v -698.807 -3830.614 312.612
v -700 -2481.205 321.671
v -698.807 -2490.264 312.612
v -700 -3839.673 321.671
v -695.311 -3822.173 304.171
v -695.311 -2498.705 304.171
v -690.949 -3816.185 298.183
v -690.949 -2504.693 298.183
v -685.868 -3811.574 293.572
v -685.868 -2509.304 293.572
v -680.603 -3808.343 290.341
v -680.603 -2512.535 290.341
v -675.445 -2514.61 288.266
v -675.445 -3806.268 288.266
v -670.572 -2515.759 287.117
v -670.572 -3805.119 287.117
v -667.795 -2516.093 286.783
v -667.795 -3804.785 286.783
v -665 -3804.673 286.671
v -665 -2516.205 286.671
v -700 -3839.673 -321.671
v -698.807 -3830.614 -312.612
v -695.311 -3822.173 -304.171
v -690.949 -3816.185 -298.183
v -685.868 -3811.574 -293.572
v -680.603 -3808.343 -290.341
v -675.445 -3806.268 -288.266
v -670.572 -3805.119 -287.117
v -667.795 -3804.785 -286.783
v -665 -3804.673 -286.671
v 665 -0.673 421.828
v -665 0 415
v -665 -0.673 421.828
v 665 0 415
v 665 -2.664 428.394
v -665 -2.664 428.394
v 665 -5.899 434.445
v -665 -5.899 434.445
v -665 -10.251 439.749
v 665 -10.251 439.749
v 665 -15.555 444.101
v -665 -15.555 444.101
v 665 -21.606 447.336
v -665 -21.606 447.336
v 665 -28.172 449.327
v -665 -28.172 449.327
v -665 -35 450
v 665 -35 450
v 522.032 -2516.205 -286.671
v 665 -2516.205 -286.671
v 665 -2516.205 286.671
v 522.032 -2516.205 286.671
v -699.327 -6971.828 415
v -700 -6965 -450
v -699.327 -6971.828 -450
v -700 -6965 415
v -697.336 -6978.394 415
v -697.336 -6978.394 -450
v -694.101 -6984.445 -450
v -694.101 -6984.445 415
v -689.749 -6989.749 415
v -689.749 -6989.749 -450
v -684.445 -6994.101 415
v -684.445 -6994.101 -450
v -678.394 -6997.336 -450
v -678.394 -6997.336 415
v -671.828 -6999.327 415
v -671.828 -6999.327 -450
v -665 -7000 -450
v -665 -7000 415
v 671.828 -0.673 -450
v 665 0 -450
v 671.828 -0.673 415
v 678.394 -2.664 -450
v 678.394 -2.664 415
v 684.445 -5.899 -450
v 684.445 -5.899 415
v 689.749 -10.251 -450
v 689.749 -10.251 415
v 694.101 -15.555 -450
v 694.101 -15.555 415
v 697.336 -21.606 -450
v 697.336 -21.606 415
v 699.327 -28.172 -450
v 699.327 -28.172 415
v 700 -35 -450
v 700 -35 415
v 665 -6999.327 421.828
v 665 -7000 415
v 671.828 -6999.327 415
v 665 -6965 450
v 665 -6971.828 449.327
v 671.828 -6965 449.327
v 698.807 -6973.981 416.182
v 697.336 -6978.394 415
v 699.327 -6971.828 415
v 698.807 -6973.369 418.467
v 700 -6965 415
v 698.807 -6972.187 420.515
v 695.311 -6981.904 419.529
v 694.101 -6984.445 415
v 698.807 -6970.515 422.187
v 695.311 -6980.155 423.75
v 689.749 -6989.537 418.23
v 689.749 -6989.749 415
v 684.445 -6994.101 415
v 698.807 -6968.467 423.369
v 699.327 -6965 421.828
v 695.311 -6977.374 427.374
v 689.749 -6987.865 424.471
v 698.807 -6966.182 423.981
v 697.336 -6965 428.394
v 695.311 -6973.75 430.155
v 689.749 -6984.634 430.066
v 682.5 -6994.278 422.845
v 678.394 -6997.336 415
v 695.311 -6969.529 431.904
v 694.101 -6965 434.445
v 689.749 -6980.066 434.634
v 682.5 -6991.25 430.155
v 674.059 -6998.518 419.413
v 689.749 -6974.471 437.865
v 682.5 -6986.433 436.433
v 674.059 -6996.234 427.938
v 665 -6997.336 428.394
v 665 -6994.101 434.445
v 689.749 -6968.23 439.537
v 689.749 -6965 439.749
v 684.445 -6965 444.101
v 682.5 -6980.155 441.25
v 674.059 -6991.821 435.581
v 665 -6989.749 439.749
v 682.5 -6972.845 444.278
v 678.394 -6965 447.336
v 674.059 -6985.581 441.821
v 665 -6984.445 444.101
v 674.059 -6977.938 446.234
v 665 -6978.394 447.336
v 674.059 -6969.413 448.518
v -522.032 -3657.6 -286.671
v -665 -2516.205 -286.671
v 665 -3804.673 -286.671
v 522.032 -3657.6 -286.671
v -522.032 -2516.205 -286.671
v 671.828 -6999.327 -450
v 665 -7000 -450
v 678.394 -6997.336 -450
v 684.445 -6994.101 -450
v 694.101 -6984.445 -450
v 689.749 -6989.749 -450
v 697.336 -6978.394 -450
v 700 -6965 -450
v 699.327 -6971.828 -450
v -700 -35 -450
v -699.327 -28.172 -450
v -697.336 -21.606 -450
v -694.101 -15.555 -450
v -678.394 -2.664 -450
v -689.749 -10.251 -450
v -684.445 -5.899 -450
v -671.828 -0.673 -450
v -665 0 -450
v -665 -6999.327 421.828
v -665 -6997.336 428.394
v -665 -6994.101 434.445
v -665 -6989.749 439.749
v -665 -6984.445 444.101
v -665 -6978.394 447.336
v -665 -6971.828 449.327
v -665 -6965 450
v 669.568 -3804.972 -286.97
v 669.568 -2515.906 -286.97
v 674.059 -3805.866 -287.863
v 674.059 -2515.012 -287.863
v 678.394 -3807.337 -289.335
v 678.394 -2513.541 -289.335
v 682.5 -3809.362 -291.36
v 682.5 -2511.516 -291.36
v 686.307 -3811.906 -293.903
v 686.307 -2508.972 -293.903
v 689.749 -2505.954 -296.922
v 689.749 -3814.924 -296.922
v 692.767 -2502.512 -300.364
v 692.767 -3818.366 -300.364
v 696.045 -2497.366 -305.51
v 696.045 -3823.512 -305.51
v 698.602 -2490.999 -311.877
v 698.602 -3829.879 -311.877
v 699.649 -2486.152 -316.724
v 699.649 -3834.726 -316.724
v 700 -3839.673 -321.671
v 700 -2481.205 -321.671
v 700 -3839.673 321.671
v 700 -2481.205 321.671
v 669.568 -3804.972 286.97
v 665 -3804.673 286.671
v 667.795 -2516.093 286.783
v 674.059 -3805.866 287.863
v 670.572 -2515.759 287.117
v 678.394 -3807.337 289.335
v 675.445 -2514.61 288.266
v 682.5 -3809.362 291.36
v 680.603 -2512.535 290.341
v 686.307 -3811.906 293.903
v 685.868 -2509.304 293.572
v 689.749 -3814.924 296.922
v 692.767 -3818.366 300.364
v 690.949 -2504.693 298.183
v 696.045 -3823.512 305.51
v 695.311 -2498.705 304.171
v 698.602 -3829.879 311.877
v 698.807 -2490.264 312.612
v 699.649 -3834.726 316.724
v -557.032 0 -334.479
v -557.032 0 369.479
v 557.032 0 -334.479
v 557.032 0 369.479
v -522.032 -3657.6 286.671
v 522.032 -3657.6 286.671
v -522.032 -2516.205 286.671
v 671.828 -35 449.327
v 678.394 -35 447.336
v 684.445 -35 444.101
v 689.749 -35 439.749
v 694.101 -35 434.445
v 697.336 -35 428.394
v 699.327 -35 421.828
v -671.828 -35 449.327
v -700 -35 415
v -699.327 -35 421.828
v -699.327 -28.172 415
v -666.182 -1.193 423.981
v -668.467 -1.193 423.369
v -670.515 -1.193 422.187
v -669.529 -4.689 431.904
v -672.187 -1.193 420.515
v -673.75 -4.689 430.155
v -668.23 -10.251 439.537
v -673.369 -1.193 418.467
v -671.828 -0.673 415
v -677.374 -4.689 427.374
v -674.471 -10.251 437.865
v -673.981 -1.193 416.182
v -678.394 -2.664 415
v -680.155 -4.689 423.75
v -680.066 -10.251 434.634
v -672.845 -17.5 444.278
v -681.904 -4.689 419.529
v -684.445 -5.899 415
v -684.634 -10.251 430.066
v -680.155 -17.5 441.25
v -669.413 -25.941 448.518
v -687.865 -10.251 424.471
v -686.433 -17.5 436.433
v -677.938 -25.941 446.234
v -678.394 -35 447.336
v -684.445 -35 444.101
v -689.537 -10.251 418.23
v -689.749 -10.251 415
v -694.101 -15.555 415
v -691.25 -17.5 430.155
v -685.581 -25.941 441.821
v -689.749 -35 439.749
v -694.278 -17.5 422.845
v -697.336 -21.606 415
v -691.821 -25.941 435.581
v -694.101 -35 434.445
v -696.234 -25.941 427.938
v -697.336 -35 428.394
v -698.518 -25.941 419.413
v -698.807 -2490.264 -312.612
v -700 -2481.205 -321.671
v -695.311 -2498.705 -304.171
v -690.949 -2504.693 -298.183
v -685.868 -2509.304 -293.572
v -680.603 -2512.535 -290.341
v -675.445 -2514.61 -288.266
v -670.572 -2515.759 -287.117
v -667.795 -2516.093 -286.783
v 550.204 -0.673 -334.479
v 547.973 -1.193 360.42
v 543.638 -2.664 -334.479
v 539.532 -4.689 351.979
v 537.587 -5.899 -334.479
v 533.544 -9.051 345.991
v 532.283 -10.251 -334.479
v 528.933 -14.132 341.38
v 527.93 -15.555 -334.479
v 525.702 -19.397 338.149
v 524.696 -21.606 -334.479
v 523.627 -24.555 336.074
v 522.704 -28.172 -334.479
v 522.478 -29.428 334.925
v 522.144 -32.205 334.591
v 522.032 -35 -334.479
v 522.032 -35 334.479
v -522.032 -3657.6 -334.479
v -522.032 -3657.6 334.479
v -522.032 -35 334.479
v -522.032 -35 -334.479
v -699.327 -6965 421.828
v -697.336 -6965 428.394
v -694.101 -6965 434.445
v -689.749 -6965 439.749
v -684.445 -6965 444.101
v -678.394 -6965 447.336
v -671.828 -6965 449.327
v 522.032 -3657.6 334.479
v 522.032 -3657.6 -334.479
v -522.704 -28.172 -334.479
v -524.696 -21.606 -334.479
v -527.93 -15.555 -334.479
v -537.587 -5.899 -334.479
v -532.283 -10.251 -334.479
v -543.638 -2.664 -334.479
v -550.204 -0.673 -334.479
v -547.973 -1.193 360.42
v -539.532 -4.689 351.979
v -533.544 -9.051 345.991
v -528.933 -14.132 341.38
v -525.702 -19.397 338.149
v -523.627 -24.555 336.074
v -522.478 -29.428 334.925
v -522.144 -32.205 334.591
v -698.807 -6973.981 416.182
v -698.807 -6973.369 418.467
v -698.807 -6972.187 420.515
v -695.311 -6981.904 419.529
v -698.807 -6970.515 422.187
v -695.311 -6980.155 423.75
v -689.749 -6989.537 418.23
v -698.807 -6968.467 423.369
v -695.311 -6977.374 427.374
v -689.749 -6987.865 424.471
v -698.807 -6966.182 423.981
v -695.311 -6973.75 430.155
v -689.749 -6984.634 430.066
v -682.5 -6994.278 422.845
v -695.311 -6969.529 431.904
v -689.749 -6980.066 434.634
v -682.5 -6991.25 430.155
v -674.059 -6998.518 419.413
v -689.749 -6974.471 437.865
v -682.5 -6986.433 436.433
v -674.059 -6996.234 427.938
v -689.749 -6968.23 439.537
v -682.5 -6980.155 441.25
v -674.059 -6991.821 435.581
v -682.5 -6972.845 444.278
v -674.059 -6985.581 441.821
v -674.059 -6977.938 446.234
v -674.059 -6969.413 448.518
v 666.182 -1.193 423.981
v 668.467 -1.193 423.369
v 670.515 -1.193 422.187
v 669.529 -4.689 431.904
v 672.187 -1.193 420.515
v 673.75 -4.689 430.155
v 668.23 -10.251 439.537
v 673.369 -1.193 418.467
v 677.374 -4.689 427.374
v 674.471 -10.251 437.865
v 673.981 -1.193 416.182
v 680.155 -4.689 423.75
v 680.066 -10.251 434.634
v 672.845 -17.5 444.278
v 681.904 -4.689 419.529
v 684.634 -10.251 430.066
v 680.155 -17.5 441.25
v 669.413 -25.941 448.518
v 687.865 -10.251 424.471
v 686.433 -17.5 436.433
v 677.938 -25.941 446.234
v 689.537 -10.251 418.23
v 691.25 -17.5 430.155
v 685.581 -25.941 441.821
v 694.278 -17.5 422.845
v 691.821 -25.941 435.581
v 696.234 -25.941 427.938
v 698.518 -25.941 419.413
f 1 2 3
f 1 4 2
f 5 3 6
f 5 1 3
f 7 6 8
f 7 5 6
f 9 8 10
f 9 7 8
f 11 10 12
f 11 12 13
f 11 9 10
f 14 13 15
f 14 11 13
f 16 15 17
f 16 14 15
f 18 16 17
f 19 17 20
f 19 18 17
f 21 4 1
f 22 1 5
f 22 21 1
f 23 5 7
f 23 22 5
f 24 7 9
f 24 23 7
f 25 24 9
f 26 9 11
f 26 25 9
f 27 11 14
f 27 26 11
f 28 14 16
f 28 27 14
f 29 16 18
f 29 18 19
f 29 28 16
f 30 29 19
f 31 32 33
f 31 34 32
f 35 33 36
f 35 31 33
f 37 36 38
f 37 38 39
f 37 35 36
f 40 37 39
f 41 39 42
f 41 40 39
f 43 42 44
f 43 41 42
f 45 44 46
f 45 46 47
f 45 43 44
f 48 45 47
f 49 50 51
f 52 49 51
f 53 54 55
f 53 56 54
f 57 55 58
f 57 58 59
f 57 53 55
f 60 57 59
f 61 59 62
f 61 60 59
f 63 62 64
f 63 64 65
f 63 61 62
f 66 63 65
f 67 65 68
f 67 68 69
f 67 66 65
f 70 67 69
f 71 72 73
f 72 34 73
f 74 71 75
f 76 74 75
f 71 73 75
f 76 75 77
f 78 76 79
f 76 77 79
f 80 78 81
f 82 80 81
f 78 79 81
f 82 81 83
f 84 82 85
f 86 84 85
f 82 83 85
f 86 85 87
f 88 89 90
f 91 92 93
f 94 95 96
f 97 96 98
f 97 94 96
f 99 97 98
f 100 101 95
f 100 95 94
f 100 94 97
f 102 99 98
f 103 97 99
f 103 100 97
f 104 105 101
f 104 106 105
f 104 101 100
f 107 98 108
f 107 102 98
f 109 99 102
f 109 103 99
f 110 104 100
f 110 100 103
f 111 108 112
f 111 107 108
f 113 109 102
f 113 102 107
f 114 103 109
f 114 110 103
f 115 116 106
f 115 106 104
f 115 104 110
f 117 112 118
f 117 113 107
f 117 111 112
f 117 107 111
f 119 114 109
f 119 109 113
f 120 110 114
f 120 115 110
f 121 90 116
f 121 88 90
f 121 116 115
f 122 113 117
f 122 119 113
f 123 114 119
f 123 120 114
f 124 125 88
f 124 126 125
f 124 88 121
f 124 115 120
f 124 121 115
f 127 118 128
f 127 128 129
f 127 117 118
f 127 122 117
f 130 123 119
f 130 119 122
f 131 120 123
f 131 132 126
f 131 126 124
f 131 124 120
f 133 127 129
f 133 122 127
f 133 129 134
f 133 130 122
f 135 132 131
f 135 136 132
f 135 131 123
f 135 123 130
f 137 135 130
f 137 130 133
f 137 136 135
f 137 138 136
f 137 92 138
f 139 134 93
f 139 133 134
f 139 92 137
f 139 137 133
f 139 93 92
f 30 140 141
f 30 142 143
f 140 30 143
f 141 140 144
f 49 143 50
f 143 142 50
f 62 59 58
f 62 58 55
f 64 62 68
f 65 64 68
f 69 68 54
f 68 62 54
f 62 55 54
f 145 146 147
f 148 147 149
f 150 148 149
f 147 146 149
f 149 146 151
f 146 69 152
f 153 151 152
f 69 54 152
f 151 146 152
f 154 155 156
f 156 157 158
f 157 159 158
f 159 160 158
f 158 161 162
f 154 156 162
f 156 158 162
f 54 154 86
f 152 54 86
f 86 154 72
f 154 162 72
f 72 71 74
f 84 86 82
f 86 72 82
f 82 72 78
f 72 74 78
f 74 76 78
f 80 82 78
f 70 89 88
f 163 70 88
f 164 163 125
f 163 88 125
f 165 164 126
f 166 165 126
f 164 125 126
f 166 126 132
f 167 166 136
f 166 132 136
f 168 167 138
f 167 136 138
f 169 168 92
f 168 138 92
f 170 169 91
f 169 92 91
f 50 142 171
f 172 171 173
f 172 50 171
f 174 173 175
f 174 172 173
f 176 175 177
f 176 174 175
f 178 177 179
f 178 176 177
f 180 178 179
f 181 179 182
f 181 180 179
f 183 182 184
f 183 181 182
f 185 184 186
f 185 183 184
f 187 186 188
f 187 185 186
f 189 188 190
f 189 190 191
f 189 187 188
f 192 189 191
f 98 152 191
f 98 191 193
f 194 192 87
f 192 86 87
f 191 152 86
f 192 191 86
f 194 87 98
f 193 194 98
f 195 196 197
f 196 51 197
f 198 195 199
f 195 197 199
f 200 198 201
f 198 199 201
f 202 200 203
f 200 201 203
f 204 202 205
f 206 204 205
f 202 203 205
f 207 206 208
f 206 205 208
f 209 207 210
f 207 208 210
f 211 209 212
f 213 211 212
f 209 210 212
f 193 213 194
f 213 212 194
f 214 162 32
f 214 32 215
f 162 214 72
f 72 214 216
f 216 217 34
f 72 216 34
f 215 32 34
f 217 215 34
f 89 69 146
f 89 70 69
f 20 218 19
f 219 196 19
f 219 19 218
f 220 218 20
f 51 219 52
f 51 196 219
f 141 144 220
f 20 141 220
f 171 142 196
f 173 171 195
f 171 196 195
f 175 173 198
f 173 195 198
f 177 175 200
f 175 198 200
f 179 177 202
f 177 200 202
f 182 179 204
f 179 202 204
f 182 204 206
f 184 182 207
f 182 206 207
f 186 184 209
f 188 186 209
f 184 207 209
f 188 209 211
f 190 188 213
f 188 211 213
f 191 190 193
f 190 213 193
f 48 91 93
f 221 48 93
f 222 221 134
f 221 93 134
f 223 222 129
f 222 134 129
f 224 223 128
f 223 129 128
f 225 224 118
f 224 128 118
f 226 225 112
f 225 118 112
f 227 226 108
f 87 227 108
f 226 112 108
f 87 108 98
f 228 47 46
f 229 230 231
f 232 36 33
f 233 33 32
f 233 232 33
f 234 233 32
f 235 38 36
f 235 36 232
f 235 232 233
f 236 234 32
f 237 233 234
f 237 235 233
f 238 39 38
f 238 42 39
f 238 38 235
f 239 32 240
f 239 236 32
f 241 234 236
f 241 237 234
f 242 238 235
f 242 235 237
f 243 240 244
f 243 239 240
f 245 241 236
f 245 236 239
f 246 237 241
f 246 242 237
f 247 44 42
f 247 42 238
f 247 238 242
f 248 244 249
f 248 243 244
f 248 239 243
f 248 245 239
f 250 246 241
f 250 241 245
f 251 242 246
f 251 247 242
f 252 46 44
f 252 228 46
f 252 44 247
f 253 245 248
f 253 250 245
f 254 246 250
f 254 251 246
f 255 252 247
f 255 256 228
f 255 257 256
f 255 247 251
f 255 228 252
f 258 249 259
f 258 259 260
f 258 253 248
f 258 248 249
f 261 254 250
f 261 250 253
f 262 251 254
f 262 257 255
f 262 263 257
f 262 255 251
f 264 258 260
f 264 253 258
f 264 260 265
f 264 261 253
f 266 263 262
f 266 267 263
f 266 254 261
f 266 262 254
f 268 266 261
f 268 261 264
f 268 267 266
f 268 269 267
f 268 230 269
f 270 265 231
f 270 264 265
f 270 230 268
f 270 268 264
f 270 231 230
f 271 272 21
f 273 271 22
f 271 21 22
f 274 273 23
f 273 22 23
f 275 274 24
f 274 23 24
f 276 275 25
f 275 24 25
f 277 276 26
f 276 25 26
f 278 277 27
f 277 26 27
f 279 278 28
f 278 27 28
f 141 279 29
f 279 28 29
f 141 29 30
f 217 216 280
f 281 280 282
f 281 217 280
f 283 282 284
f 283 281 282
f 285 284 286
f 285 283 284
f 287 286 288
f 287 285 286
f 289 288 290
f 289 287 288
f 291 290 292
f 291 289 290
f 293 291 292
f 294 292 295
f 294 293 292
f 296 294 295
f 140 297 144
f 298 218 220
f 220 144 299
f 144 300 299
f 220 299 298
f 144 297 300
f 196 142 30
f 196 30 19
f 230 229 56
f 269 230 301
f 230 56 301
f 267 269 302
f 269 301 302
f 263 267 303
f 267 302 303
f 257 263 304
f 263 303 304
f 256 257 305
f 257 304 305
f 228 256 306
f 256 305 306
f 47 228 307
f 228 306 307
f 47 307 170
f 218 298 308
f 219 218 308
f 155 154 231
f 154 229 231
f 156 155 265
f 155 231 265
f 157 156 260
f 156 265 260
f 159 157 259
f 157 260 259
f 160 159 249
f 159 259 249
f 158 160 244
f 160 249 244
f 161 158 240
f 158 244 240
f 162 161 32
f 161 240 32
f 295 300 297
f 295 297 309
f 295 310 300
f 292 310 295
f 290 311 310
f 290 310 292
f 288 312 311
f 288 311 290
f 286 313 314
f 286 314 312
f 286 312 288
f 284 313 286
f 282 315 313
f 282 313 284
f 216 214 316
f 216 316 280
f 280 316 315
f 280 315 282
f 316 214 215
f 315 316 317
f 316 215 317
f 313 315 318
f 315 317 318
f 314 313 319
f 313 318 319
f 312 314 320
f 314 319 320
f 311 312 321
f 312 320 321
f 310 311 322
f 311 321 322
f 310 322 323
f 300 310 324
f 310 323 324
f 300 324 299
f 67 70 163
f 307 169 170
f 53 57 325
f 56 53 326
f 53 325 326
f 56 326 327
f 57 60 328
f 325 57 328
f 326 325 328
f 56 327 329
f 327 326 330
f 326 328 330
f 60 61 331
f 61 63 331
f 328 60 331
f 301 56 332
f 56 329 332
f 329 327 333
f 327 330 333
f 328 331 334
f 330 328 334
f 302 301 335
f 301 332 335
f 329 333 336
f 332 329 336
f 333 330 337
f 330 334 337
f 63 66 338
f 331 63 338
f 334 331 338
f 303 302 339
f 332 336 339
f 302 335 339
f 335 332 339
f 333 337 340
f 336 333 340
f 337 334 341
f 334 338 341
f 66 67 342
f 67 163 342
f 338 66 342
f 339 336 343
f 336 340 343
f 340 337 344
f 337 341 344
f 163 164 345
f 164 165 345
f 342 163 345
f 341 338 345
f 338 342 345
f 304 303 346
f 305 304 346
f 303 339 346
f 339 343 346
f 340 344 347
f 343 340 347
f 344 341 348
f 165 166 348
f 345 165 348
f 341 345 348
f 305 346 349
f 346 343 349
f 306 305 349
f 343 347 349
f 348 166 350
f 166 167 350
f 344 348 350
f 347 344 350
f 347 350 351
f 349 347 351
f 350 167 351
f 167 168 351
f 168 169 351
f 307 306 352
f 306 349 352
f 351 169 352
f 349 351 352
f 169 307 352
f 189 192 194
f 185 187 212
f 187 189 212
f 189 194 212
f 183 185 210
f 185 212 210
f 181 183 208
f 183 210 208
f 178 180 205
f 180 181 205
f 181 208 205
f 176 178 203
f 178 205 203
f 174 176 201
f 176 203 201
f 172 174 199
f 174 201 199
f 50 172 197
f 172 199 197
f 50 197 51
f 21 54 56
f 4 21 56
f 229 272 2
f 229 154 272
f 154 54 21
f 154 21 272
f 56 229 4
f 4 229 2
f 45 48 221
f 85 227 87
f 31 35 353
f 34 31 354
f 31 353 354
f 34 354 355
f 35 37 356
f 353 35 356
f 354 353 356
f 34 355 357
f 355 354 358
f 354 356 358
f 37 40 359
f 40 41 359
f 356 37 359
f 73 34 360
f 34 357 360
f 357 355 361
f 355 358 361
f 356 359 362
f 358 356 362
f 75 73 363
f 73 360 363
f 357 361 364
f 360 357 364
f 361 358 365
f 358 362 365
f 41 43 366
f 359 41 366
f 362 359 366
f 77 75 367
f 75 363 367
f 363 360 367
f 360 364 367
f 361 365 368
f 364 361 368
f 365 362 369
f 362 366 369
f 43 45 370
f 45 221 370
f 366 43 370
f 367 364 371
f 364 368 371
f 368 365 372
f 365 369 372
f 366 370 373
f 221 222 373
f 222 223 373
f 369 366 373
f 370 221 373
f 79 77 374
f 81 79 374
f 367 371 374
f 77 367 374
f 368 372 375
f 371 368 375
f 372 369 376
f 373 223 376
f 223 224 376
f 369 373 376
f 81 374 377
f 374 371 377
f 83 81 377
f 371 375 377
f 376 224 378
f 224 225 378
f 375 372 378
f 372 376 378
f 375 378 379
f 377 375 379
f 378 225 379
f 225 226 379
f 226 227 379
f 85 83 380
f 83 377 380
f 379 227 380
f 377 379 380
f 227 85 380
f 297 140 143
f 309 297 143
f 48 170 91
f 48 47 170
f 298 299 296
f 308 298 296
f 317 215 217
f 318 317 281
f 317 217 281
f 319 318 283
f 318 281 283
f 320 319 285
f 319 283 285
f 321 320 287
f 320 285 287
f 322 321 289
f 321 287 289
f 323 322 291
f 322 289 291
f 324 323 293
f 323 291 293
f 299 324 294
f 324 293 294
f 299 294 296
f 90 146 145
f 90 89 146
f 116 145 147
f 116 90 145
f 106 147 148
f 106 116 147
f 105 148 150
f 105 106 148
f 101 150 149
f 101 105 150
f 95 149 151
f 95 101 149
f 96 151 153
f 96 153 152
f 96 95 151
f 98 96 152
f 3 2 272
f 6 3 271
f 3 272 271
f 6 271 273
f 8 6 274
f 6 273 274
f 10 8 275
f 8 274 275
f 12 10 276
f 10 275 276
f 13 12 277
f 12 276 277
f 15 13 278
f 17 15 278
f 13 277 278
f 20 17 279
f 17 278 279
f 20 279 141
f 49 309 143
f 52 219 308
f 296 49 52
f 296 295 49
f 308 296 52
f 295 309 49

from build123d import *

# Parameters (mm, degrees)
F0_W     = 1400
F0_H     = 900
F1_DEPTH = 7000
F2_W     = 1044.063568
F2_H     = 668.957592
F3_DEPTH = 3657.6
F4_W     = 1288.467884
F4_H     = 573.341608
F5_DEPTH = 1400.001
F6_R     = 35
F7_R     = 35


with BuildPart() as f1:
    # F0 (on Front) → F1 (new body)
    with BuildSketch(Plane.XZ):
        Rectangle(F0_W, F0_H)
    extrude(amount=F1_DEPTH)

    # F2 (on Front) → F3 (cut)
    with BuildSketch(Plane.XZ):
        Rectangle(F2_W, F2_H)
    extrude(amount=F3_DEPTH, mode=Mode.SUBTRACT)

    # F4 (on face) → F5 (cut, through all)
    with BuildSketch(Plane.YZ.offset(700)):
        with Locations((-3160.439014, 0)):
            Rectangle(F4_W, F4_H)
    extrude(amount=-F5_DEPTH, mode=Mode.SUBTRACT)

    # F6
    f6_edges = [f1.edges().sort_by_distance(p)[0] for p in [
        (0, -7000, 450),
        (700, -7000, 0),
        (700, -3500, 450),
        (-700, -7000, 0),
        (-700, -3500, 450),
        (0, 0, 450),
        (700, 0, 0),
        (-700, 0, 0),
    ]]
    fillet(f6_edges, radius=F6_R)

    # F7
    f7_edges = [f1.edges().sort_by_distance(p)[0] for p in [
        (522.031784, 0, 0),
        (0, 0, 334.478796),
        (-522.031784, 0, 0),
        (700, -3804.672956, 0),
        (700, -3160.439014, -286.670804),
        (700, -2516.205072, 0),
        (700, -3160.439014, 286.670804),
        (-700, -3160.439014, -286.670804),
        (-700, -2516.205072, 0),
        (-700, -3160.439014, 286.670804),
        (-700, -3804.672956, 0),
    ]]
    fillet(f7_edges, radius=F7_R)


solid = f1.part
